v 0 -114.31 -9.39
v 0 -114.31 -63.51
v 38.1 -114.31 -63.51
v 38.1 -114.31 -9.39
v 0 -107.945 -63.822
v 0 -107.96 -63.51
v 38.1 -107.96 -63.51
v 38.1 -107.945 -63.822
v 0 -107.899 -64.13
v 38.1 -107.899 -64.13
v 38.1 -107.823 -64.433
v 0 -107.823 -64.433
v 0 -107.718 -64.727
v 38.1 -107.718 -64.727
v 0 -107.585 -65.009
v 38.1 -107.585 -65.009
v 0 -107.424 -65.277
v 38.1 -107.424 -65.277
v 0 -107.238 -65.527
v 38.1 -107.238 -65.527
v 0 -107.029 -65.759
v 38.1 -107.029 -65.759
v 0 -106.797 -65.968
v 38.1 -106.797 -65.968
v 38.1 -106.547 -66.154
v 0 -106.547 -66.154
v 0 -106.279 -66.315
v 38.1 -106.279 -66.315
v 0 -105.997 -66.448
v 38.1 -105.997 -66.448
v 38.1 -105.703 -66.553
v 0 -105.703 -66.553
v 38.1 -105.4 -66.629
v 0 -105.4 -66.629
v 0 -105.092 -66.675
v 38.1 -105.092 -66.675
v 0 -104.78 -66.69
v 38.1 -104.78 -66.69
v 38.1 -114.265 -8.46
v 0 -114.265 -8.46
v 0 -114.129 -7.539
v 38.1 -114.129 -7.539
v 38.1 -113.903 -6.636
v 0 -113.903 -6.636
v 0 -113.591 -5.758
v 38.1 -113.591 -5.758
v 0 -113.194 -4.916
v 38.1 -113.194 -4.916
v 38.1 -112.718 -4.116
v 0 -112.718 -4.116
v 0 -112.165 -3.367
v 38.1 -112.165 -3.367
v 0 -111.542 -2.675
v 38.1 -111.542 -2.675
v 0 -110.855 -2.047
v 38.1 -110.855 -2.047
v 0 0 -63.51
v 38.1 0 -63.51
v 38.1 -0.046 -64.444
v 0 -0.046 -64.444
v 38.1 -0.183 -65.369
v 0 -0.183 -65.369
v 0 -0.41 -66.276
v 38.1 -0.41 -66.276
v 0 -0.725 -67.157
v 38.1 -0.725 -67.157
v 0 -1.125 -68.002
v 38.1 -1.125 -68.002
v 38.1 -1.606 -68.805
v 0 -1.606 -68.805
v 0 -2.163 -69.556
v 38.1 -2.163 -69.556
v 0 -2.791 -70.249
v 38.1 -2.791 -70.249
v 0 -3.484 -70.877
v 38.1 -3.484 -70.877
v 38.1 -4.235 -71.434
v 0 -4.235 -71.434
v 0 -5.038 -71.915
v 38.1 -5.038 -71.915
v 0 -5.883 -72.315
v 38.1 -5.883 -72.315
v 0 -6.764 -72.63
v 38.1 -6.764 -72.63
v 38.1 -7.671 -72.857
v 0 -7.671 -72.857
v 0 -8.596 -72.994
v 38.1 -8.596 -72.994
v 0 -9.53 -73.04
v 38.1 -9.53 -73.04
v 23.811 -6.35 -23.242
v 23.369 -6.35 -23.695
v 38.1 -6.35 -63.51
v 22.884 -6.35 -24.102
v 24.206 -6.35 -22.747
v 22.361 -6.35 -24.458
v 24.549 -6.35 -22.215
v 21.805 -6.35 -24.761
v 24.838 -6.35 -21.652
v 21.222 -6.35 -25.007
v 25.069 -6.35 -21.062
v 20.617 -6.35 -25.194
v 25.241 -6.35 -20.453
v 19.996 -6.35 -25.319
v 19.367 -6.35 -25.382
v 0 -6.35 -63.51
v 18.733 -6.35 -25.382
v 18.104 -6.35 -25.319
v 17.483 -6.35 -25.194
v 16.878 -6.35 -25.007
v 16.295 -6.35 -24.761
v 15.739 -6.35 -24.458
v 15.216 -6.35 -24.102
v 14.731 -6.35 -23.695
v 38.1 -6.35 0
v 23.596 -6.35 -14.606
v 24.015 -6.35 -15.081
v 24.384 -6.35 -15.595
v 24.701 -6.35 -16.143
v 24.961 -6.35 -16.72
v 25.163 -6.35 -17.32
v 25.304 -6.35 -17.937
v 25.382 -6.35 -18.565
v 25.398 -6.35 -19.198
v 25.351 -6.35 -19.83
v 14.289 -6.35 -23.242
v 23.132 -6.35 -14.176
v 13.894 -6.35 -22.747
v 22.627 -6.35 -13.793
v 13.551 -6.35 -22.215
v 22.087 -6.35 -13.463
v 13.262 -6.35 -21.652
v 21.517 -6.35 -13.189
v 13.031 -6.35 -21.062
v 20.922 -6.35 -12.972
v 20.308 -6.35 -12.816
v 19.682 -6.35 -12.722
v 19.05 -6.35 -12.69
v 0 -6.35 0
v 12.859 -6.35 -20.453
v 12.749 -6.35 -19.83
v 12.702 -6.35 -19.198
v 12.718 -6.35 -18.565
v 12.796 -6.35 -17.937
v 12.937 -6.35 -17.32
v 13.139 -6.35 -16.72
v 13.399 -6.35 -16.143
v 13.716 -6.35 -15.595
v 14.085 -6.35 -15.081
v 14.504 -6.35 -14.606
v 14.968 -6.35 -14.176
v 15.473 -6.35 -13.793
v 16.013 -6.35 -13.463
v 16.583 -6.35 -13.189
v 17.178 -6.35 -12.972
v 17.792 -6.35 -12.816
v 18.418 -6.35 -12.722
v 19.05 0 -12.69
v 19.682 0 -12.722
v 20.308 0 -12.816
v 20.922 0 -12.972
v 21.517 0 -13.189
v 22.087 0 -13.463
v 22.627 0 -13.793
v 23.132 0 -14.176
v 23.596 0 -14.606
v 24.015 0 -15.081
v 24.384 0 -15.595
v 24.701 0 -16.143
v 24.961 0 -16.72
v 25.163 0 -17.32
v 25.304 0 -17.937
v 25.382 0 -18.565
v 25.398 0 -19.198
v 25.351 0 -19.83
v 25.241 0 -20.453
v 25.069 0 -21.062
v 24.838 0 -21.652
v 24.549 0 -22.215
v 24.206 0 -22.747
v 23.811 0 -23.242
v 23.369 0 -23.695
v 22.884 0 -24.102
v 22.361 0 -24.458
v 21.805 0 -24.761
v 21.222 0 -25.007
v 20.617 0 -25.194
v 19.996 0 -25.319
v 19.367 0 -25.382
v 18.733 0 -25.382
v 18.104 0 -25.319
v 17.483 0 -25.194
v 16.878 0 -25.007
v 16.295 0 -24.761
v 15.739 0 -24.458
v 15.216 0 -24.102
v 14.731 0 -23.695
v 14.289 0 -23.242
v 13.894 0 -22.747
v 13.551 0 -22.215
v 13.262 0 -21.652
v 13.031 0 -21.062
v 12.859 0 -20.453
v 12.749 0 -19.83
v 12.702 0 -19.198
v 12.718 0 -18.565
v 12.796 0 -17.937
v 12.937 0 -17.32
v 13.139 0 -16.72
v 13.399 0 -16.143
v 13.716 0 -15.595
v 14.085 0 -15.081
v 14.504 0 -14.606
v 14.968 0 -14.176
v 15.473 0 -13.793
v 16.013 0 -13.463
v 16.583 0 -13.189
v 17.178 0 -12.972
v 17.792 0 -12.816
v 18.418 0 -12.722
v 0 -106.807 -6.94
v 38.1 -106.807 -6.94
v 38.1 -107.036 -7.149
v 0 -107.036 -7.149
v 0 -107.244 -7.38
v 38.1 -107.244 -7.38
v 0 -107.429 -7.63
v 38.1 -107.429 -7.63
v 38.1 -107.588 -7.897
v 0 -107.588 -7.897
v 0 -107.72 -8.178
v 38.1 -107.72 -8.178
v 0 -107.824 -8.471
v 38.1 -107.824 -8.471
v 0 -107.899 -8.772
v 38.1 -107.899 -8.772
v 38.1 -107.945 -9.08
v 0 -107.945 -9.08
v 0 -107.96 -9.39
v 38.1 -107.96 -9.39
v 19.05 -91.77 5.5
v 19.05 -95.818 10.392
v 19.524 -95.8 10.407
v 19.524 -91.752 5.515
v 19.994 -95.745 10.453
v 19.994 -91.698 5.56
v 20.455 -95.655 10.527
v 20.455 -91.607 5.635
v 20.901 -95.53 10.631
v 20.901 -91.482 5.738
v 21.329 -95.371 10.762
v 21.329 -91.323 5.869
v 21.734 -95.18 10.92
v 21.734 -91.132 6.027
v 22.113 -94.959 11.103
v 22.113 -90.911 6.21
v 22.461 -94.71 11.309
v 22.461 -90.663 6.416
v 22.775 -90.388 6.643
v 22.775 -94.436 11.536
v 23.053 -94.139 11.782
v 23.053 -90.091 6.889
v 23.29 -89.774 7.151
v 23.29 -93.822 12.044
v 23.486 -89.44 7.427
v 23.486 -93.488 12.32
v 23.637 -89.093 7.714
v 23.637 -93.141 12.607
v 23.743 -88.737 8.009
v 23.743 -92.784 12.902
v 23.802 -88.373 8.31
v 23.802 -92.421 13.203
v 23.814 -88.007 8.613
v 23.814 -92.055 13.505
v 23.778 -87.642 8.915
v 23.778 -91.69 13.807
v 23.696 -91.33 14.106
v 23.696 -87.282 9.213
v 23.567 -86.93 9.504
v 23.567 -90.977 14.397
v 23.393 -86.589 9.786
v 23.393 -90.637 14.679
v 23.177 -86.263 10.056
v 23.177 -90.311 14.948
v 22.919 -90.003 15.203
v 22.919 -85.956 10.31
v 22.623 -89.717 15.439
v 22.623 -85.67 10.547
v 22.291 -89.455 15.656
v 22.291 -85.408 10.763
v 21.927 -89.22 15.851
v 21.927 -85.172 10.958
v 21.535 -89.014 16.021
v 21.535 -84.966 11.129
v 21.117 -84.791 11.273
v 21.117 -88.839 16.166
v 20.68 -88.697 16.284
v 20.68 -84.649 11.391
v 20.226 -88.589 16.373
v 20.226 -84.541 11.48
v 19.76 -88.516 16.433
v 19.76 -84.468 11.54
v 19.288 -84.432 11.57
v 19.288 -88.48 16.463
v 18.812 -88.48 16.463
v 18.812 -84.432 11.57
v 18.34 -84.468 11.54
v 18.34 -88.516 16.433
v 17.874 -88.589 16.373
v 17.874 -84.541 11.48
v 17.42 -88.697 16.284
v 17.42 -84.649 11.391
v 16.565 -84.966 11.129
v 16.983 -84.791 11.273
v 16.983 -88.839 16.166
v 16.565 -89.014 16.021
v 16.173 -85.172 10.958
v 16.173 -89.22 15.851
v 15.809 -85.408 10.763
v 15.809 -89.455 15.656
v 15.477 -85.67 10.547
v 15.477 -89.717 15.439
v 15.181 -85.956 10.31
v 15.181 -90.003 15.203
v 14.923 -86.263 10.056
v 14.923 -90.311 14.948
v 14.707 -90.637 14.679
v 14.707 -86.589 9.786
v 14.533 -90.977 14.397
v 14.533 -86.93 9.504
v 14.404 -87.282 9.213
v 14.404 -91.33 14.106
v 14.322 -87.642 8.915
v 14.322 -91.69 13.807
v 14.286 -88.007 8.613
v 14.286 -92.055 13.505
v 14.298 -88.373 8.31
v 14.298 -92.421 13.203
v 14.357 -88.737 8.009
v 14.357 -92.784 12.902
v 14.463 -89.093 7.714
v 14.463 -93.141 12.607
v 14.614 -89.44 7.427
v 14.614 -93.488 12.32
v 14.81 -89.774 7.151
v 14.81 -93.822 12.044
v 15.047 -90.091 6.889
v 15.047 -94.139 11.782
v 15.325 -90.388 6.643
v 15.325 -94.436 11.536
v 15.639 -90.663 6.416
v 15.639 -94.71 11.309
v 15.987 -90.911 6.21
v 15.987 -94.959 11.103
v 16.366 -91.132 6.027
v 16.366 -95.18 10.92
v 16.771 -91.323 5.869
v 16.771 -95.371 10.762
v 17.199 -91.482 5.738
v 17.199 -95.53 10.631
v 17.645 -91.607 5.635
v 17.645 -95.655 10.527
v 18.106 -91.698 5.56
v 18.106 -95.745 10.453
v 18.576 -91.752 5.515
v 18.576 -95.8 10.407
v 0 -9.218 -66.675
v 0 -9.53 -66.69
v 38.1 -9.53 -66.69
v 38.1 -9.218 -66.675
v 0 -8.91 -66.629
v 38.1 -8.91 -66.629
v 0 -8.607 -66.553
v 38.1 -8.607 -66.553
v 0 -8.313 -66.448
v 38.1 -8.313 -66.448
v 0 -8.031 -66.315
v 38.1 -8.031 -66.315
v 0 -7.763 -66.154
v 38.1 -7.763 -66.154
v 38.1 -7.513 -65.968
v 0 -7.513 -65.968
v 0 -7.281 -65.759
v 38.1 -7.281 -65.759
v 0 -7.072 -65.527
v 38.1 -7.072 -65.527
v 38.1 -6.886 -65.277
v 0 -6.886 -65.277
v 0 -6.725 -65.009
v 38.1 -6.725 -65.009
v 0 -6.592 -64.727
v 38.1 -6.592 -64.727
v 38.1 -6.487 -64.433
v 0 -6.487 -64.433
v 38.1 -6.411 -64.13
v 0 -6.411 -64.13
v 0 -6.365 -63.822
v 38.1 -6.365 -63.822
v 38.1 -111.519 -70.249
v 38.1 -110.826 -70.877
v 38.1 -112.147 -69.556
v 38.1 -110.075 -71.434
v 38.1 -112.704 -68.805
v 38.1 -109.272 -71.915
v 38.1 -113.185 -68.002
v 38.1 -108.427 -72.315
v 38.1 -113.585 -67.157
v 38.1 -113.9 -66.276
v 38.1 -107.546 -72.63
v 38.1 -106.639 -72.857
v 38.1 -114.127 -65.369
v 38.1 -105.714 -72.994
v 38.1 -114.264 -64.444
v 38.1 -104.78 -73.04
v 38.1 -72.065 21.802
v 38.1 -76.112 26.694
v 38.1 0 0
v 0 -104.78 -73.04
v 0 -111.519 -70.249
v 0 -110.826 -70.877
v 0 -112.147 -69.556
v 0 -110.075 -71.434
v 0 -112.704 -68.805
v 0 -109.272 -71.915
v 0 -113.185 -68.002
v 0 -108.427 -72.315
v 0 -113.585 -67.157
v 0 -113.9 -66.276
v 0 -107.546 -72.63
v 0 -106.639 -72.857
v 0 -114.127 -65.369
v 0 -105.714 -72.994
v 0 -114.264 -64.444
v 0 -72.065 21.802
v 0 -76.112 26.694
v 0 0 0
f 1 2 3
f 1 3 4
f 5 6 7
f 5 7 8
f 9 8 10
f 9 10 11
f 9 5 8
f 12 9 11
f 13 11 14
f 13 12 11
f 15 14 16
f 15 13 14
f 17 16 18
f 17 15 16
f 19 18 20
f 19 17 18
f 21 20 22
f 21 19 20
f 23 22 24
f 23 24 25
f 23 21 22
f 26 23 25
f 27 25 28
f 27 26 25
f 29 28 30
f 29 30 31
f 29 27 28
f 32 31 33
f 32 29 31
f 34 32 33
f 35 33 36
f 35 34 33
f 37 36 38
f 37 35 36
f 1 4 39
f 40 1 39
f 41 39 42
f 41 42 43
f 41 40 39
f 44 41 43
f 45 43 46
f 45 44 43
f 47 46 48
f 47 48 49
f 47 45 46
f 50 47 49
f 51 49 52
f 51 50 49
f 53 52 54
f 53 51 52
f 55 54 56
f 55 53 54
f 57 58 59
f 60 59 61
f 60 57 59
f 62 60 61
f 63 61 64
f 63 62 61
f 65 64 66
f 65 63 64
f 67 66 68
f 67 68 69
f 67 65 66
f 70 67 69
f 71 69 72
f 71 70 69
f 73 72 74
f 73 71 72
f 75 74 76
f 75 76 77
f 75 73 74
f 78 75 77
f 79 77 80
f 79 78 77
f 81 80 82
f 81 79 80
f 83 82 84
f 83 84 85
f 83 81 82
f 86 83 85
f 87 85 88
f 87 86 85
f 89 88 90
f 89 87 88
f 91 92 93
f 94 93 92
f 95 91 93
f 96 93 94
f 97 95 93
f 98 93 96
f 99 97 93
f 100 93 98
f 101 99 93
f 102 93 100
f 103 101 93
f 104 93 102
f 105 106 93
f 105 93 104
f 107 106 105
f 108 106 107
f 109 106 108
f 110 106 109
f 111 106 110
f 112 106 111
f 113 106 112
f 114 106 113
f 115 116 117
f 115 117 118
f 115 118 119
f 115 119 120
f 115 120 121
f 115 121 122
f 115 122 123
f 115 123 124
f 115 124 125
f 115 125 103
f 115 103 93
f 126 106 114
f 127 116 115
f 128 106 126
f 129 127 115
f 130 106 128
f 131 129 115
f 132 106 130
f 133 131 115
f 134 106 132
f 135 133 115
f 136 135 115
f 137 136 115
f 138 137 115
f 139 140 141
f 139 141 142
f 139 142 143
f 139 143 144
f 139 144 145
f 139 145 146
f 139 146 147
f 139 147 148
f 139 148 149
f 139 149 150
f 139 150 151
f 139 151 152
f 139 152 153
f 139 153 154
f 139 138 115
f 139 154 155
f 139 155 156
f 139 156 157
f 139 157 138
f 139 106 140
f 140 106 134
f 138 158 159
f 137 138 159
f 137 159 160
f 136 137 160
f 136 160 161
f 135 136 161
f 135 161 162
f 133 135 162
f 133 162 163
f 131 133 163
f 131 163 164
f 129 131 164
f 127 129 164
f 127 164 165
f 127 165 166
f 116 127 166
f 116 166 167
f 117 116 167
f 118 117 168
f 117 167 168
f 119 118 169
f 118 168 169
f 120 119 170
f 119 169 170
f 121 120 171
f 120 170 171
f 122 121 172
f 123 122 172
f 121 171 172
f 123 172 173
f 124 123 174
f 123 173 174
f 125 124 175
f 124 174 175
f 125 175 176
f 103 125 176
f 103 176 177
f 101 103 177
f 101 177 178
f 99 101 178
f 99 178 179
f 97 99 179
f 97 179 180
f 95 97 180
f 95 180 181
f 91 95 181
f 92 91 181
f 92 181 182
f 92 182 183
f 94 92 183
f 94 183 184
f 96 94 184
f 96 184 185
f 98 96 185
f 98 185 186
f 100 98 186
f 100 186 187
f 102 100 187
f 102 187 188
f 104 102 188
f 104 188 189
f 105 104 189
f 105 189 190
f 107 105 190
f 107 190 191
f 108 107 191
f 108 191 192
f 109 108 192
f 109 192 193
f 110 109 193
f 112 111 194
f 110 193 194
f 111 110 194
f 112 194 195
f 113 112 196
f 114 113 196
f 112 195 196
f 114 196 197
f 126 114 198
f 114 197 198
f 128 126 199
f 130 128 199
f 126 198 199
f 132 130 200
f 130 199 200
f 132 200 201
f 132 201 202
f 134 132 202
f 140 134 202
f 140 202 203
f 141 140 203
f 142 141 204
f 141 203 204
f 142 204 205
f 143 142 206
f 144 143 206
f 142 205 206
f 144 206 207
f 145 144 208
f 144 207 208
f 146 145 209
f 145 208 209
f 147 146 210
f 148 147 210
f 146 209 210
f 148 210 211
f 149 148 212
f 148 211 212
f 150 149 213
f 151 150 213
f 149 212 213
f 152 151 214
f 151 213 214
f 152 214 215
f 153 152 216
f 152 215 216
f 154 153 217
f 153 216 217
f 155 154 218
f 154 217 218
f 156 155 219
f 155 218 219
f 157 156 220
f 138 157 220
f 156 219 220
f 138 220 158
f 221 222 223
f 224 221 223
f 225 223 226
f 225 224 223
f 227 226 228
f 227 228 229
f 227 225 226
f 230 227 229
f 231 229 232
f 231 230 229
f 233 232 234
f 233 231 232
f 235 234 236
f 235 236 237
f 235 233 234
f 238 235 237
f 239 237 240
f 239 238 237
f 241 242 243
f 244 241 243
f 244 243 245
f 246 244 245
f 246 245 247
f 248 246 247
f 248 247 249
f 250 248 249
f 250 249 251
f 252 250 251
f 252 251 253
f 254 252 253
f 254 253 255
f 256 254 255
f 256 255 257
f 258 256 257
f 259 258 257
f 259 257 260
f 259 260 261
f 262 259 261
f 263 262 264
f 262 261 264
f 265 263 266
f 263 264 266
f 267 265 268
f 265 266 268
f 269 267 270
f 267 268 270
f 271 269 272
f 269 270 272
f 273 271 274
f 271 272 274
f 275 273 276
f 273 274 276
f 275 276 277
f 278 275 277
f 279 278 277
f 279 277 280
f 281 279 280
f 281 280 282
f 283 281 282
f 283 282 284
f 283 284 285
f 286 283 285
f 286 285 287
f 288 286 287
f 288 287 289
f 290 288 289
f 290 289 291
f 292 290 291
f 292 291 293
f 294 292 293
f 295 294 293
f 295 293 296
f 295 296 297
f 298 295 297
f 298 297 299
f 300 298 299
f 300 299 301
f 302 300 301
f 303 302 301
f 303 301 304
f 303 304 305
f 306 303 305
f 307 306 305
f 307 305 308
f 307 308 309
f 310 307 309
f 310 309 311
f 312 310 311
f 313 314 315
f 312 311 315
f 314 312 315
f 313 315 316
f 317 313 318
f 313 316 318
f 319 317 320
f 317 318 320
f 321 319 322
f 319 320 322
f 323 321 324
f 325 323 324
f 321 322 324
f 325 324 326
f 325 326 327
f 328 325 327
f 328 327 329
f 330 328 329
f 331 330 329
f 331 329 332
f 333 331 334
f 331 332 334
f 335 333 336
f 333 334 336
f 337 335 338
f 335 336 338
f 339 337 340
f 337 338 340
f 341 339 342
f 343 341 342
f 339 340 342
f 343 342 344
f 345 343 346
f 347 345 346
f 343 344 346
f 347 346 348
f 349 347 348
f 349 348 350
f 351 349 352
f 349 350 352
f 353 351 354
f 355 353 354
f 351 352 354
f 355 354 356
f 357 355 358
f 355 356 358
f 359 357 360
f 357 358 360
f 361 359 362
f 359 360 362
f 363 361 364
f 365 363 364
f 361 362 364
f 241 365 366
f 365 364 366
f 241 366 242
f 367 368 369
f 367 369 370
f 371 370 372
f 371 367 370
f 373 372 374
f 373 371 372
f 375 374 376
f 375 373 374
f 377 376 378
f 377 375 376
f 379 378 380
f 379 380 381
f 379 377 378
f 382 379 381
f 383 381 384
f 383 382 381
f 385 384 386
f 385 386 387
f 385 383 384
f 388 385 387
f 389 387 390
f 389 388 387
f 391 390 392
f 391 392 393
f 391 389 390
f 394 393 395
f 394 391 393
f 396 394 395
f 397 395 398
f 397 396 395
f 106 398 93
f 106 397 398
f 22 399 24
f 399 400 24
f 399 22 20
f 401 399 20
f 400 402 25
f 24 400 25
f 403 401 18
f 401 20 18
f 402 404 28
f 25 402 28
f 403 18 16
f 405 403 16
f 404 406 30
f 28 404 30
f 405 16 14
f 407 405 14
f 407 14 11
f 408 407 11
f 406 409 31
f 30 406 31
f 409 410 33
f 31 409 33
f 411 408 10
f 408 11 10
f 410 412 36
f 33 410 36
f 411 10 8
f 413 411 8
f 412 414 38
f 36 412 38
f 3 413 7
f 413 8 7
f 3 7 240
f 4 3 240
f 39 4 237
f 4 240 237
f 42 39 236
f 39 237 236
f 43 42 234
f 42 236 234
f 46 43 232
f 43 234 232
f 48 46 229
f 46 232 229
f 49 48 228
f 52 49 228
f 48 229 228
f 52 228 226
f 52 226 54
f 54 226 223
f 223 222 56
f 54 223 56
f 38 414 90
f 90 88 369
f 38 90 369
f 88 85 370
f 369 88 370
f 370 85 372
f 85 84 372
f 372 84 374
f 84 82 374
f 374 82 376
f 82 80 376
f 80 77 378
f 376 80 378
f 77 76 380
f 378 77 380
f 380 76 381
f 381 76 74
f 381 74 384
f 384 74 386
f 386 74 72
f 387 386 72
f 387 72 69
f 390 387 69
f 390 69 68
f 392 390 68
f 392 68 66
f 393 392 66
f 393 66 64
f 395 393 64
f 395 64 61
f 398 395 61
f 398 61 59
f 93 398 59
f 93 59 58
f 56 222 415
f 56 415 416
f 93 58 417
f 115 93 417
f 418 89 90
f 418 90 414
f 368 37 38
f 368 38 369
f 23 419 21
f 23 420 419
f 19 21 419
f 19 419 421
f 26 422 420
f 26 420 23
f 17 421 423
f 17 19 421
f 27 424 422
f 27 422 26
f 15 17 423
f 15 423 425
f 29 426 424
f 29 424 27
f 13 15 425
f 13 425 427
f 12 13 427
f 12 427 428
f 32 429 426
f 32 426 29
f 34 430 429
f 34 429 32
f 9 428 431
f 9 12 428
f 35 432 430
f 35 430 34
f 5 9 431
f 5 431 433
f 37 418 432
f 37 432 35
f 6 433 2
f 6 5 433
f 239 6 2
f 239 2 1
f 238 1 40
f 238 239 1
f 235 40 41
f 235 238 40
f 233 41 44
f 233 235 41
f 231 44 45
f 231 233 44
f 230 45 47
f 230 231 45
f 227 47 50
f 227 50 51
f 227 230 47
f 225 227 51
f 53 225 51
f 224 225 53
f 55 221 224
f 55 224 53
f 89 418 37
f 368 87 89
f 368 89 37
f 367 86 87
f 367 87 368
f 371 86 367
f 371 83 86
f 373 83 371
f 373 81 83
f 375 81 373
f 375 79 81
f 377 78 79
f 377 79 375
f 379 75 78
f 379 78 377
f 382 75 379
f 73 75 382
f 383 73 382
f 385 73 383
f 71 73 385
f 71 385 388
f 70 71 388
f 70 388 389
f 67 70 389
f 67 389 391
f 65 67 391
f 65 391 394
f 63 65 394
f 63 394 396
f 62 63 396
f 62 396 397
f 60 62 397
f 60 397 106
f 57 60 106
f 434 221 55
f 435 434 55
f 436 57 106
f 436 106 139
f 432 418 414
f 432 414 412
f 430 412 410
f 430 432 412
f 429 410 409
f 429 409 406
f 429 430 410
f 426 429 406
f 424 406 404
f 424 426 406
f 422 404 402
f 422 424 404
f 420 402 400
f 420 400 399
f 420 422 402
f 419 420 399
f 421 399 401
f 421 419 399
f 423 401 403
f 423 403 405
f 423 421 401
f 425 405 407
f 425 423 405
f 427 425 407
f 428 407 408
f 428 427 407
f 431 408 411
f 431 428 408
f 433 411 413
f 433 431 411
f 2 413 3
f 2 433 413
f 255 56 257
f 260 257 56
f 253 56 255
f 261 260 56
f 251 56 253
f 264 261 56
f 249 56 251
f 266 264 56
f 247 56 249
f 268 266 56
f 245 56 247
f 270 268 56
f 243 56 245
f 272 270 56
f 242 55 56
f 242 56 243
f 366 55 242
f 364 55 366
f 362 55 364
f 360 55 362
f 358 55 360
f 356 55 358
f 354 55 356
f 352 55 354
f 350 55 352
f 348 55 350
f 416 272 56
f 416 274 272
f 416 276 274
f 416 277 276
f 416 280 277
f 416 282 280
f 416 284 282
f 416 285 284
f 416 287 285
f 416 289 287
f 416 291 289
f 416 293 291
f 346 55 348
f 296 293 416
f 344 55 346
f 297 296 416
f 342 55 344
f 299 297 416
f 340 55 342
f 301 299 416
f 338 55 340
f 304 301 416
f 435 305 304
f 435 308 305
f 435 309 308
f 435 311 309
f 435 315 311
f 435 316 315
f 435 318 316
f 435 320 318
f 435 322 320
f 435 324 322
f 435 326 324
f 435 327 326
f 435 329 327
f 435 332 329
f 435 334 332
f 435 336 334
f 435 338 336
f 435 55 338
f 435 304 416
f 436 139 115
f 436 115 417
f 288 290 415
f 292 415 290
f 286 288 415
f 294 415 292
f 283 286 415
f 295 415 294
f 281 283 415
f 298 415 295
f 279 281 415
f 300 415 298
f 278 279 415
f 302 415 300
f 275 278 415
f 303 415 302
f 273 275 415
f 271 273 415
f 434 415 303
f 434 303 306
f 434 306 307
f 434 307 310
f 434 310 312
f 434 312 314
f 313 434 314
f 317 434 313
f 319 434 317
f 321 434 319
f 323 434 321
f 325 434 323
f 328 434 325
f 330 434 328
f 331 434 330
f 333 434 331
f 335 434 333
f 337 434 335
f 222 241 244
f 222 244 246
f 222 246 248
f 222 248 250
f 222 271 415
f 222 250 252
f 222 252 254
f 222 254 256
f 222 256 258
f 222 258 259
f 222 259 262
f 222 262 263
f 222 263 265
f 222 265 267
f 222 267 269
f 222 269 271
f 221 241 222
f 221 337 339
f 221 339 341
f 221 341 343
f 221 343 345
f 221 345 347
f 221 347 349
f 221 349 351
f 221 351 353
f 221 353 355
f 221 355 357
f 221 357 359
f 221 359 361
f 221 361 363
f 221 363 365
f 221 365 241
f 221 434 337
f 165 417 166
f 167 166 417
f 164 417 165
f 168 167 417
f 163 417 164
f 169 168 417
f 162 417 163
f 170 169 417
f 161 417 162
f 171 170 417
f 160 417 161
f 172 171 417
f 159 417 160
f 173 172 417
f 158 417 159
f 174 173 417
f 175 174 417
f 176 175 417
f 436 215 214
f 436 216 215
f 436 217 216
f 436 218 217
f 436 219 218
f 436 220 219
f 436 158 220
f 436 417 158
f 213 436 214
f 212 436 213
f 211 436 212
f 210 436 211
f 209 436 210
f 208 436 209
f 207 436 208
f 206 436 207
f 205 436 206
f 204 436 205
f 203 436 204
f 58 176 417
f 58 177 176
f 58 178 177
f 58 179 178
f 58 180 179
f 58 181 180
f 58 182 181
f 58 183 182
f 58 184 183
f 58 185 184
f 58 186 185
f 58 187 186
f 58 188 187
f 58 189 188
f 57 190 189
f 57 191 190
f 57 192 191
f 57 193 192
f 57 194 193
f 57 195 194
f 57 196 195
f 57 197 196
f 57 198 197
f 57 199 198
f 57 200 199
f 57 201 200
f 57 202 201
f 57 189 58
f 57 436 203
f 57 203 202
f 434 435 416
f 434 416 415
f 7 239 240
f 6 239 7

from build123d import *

# Parameters (mm, degrees)
Y_KSEKLIK_EKSTR_ZYON1_DEPTH = 38.1
KES_EKSTR_ZYON1_REACH       = 142.901
IZIM2_R                     = 6.35
KES_EKSTR_ZYON2_REACH       = 151.446
IZIM3_R                     = 4.765


with BuildPart() as part:
    # Çizim1 → Yükseklik-Ekstrüzyon1 (new body)
    with BuildSketch(Plane(origin=(0, 0, 0), x_dir=(0, 0, -1), z_dir=(1, 0, 0))):
        with BuildLine():
            Line((0, 0), (63.51, 0))
            ThreePointArc((63.51, 0), (70.248727625, -2.791272375), (73.04, -9.53))
            Line((73.04, -9.53), (73.04, -104.78))
            ThreePointArc((73.04, -104.78), (70.248727625, -111.518727625), (63.51, -114.31))
            Line((63.51, -114.31), (9.39, -114.31))
            ThreePointArc((9.39, -114.31), (5.332325351, -113.403002751), (2.047011614, -110.854654028))
            Line((2.047011614, -110.854654028), (-26.694452199, -76.112225243))
            Line((-26.694452199, -76.112225243), (-21.801694985, -72.064580639))
            Line((-21.801694985, -72.064580639), (6.939768828, -106.807009424))
            ThreePointArc((6.939768828, -106.807009424), (8.03602252, -107.657350341), (9.39, -107.96))
            Line((9.39, -107.96), (63.51, -107.96))
            ThreePointArc((63.51, -107.96), (65.758599564, -107.028599564), (66.69, -104.78))
            Line((66.69, -104.78), (66.69, -9.53))
            ThreePointArc((66.69, -9.53), (65.758599564, -7.281400436), (63.51, -6.35))
            Line((63.51, -6.35), (0, -6.35))
            Line((0, -6.35), (0, 0))
        make_face()
    extrude(amount=Y_KSEKLIK_EKSTR_ZYON1_DEPTH)

    # Çizim2 → Kes-Ekstrüzyon1 (cut, up to next)
    with BuildSketch(Plane(origin=(0, 0, 0), x_dir=(1, 0, 0), z_dir=(0, 1, 0)), mode=Mode.PRIVATE) as kes_ekstr_zyon1_sk1:
        with Locations(Location((19.05, 19.04, 0), (0, 0, 270))):
            Circle(IZIM2_R)
    kes_ekstr_zyon1_tool1 = extrude(kes_ekstr_zyon1_sk1.sketch, amount=-KES_EKSTR_ZYON1_REACH, mode=Mode.PRIVATE) & part.part
    add(kes_ekstr_zyon1_tool1.solids().sort_by_distance((19.05, 0, -19.04))[0], mode=Mode.SUBTRACT)

    # Çizim3 → Kes-Ekstrüzyon2 (cut, up to next)
    with BuildSketch(Plane(origin=(0, -44.03595524, 53.230275565), x_dir=(1, 0, 0), z_dir=(0, -0.6374243471515584, 0.770512947106283)), mode=Mode.PRIVATE) as kes_ekstr_zyon2_sk1:
        with Locations(Location((19.05, -62.439761218, 0), (0, 0, 270))):
            Circle(IZIM3_R)
    kes_ekstr_zyon2_tool1 = extrude(kes_ekstr_zyon2_sk1.sketch, amount=-KES_EKSTR_ZYON2_REACH, mode=Mode.PRIVATE) & part.part
    add(kes_ekstr_zyon2_tool1.solids().sort_by_distance((19.05, -92.1466, 13.429652))[0], mode=Mode.SUBTRACT)


solid = part.part
